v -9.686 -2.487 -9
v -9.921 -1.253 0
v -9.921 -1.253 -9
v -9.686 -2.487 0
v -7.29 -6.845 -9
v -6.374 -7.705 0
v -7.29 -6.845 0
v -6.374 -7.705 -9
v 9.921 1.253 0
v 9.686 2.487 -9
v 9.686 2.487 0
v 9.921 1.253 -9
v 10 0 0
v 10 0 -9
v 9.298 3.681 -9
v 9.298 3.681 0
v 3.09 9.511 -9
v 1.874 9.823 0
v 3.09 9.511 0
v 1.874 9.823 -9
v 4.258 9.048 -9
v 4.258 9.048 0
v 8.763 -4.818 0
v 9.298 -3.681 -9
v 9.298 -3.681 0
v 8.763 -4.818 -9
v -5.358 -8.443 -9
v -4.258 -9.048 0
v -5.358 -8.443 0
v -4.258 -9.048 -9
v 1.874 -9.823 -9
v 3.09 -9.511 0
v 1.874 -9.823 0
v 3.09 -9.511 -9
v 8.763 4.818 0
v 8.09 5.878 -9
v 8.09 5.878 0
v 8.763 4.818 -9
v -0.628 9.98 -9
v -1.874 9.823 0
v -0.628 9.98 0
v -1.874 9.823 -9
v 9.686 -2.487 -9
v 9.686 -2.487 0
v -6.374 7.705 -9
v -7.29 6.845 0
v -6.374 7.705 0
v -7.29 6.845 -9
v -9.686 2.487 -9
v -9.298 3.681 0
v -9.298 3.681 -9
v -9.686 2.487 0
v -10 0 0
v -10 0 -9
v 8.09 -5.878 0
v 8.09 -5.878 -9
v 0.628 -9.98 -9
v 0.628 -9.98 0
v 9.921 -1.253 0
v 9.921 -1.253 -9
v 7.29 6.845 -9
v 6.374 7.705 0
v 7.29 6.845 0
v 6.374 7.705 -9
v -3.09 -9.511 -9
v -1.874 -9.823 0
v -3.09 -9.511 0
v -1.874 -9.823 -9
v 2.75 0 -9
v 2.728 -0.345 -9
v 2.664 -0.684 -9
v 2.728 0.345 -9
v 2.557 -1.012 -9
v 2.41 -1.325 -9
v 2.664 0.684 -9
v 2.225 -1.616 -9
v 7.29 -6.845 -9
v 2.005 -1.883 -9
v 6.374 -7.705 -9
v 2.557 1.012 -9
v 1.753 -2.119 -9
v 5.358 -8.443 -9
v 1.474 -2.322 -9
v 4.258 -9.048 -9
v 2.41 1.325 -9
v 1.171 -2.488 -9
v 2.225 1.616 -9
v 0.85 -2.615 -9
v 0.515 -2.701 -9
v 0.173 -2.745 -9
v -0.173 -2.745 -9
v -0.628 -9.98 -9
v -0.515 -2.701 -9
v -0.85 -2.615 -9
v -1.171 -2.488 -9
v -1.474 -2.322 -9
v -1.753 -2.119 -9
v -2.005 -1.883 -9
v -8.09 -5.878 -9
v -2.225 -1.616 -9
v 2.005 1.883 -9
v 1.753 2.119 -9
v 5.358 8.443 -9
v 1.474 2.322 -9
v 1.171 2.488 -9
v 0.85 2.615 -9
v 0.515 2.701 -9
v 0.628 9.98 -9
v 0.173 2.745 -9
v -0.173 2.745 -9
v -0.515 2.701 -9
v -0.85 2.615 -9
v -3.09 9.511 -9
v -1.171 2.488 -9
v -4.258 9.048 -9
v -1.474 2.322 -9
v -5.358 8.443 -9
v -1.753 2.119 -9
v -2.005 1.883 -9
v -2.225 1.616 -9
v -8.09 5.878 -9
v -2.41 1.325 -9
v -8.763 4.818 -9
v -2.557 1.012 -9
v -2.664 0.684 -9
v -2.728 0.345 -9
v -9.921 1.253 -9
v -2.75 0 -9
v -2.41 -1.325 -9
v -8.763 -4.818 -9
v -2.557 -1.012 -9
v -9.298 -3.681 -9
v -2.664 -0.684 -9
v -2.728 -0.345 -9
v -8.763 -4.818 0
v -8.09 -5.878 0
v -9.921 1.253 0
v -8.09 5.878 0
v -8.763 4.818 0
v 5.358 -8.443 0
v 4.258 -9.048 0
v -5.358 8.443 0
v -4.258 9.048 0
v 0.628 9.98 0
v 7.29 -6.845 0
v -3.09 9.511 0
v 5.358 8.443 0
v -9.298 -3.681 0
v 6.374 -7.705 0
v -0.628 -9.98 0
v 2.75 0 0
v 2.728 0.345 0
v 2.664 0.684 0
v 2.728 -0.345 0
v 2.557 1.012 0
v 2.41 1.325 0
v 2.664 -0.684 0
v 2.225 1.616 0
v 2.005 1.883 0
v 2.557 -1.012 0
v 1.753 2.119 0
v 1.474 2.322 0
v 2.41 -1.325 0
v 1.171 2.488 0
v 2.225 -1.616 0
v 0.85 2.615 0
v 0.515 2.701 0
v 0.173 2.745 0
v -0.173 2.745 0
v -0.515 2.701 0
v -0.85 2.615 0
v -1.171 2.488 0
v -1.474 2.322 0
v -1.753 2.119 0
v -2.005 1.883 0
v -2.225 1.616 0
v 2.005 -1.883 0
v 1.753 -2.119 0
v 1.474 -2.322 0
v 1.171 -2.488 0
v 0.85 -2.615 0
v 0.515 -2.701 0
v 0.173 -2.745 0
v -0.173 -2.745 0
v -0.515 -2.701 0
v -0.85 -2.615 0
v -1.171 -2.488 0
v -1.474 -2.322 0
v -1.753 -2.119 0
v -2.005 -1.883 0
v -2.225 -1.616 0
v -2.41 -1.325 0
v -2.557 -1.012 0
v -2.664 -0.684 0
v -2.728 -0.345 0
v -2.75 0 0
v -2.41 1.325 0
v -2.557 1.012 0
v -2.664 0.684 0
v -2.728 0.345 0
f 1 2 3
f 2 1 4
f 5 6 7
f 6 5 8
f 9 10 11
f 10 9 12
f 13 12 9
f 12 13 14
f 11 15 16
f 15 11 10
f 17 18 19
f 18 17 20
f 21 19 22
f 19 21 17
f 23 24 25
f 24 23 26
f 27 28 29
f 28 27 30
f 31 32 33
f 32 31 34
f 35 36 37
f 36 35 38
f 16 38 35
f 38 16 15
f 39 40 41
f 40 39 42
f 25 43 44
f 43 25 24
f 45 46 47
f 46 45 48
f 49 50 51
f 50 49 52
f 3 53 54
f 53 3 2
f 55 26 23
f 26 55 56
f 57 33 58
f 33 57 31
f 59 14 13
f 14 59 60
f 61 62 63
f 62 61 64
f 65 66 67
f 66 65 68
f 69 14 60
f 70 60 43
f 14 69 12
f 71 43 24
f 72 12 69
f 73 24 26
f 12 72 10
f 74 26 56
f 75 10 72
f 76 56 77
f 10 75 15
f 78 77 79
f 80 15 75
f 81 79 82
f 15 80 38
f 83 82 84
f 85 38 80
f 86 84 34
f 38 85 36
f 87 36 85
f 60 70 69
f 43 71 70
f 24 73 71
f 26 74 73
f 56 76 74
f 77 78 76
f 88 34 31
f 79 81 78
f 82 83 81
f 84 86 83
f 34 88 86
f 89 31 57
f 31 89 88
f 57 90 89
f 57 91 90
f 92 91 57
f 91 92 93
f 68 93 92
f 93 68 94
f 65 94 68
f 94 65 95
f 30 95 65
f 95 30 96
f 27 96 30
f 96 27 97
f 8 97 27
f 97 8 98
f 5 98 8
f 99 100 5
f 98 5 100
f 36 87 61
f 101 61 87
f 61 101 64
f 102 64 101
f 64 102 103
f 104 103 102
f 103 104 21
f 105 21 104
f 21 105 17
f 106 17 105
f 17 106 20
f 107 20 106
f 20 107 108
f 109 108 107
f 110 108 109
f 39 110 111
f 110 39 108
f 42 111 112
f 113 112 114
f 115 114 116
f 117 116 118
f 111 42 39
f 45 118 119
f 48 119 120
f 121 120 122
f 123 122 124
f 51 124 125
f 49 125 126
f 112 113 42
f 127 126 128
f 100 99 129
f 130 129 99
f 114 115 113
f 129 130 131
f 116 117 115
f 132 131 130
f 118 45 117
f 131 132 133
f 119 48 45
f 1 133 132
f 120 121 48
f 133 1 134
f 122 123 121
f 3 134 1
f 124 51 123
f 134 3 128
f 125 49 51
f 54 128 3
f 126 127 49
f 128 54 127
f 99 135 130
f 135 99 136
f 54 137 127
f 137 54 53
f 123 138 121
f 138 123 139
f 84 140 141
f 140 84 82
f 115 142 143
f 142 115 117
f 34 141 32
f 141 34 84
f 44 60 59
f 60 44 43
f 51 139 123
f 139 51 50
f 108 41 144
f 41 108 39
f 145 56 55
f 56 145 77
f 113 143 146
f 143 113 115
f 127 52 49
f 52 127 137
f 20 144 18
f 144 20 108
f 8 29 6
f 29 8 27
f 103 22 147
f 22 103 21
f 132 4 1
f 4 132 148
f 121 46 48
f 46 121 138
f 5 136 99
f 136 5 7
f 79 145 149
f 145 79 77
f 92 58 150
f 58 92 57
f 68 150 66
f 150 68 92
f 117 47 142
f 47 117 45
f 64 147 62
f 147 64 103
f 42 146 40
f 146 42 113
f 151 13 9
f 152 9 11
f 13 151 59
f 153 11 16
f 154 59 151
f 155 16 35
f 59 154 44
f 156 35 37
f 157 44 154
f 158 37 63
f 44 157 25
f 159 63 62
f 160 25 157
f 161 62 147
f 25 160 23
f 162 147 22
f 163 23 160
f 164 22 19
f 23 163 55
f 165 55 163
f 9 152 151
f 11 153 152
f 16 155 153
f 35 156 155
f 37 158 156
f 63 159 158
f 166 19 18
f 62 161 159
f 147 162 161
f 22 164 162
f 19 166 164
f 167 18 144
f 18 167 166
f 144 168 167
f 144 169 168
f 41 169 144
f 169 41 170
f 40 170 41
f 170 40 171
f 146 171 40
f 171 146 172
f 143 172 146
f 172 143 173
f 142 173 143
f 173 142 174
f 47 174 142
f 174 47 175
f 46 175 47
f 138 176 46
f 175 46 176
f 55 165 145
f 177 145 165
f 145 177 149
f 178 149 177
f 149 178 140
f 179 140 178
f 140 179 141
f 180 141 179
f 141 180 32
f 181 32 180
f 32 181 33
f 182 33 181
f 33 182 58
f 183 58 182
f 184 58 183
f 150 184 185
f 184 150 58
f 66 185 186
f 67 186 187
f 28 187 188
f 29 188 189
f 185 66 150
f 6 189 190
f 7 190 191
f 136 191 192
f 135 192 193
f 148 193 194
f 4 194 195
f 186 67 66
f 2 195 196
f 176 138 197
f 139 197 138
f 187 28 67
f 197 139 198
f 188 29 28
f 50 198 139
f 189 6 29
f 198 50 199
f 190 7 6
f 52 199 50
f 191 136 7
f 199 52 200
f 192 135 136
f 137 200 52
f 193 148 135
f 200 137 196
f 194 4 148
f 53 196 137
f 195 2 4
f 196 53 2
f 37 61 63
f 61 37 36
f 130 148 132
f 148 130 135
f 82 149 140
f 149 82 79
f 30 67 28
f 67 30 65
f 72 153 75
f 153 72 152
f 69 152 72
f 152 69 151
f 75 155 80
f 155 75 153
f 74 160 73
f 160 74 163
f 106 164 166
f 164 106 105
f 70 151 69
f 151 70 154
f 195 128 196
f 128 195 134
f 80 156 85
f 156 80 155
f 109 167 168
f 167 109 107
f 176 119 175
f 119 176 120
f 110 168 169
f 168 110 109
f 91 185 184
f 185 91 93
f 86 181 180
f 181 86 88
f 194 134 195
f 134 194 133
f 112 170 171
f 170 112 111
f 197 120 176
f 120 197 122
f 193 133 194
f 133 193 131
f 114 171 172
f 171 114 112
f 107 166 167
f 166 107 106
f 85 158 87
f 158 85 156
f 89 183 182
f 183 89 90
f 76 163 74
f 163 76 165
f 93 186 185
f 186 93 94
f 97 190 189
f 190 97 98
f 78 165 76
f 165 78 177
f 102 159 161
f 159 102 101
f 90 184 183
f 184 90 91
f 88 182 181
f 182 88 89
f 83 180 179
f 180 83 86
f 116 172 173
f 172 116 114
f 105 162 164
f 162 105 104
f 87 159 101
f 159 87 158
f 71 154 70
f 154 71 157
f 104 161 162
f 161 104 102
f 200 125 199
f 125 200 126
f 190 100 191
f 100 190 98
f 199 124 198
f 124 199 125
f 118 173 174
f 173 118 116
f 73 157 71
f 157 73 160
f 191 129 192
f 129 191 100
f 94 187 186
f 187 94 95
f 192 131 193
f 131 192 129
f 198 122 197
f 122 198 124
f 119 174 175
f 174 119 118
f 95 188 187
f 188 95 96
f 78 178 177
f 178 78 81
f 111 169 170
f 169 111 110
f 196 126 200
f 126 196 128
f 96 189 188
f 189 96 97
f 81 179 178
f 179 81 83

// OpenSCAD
$fn = 50;


difference() {
	union() {
		translate(v = [0, 0, -9.0000000000]) {
			cylinder(h = 9, r = 10.0000000000);
		}
		cylinder(h = 0, r = 13.0000000000);
	}
	union() {
		#translate(v = [0, 0, -9]) {
			cylinder(h = 9, r = 2.7500000000);
		}
	}
}
